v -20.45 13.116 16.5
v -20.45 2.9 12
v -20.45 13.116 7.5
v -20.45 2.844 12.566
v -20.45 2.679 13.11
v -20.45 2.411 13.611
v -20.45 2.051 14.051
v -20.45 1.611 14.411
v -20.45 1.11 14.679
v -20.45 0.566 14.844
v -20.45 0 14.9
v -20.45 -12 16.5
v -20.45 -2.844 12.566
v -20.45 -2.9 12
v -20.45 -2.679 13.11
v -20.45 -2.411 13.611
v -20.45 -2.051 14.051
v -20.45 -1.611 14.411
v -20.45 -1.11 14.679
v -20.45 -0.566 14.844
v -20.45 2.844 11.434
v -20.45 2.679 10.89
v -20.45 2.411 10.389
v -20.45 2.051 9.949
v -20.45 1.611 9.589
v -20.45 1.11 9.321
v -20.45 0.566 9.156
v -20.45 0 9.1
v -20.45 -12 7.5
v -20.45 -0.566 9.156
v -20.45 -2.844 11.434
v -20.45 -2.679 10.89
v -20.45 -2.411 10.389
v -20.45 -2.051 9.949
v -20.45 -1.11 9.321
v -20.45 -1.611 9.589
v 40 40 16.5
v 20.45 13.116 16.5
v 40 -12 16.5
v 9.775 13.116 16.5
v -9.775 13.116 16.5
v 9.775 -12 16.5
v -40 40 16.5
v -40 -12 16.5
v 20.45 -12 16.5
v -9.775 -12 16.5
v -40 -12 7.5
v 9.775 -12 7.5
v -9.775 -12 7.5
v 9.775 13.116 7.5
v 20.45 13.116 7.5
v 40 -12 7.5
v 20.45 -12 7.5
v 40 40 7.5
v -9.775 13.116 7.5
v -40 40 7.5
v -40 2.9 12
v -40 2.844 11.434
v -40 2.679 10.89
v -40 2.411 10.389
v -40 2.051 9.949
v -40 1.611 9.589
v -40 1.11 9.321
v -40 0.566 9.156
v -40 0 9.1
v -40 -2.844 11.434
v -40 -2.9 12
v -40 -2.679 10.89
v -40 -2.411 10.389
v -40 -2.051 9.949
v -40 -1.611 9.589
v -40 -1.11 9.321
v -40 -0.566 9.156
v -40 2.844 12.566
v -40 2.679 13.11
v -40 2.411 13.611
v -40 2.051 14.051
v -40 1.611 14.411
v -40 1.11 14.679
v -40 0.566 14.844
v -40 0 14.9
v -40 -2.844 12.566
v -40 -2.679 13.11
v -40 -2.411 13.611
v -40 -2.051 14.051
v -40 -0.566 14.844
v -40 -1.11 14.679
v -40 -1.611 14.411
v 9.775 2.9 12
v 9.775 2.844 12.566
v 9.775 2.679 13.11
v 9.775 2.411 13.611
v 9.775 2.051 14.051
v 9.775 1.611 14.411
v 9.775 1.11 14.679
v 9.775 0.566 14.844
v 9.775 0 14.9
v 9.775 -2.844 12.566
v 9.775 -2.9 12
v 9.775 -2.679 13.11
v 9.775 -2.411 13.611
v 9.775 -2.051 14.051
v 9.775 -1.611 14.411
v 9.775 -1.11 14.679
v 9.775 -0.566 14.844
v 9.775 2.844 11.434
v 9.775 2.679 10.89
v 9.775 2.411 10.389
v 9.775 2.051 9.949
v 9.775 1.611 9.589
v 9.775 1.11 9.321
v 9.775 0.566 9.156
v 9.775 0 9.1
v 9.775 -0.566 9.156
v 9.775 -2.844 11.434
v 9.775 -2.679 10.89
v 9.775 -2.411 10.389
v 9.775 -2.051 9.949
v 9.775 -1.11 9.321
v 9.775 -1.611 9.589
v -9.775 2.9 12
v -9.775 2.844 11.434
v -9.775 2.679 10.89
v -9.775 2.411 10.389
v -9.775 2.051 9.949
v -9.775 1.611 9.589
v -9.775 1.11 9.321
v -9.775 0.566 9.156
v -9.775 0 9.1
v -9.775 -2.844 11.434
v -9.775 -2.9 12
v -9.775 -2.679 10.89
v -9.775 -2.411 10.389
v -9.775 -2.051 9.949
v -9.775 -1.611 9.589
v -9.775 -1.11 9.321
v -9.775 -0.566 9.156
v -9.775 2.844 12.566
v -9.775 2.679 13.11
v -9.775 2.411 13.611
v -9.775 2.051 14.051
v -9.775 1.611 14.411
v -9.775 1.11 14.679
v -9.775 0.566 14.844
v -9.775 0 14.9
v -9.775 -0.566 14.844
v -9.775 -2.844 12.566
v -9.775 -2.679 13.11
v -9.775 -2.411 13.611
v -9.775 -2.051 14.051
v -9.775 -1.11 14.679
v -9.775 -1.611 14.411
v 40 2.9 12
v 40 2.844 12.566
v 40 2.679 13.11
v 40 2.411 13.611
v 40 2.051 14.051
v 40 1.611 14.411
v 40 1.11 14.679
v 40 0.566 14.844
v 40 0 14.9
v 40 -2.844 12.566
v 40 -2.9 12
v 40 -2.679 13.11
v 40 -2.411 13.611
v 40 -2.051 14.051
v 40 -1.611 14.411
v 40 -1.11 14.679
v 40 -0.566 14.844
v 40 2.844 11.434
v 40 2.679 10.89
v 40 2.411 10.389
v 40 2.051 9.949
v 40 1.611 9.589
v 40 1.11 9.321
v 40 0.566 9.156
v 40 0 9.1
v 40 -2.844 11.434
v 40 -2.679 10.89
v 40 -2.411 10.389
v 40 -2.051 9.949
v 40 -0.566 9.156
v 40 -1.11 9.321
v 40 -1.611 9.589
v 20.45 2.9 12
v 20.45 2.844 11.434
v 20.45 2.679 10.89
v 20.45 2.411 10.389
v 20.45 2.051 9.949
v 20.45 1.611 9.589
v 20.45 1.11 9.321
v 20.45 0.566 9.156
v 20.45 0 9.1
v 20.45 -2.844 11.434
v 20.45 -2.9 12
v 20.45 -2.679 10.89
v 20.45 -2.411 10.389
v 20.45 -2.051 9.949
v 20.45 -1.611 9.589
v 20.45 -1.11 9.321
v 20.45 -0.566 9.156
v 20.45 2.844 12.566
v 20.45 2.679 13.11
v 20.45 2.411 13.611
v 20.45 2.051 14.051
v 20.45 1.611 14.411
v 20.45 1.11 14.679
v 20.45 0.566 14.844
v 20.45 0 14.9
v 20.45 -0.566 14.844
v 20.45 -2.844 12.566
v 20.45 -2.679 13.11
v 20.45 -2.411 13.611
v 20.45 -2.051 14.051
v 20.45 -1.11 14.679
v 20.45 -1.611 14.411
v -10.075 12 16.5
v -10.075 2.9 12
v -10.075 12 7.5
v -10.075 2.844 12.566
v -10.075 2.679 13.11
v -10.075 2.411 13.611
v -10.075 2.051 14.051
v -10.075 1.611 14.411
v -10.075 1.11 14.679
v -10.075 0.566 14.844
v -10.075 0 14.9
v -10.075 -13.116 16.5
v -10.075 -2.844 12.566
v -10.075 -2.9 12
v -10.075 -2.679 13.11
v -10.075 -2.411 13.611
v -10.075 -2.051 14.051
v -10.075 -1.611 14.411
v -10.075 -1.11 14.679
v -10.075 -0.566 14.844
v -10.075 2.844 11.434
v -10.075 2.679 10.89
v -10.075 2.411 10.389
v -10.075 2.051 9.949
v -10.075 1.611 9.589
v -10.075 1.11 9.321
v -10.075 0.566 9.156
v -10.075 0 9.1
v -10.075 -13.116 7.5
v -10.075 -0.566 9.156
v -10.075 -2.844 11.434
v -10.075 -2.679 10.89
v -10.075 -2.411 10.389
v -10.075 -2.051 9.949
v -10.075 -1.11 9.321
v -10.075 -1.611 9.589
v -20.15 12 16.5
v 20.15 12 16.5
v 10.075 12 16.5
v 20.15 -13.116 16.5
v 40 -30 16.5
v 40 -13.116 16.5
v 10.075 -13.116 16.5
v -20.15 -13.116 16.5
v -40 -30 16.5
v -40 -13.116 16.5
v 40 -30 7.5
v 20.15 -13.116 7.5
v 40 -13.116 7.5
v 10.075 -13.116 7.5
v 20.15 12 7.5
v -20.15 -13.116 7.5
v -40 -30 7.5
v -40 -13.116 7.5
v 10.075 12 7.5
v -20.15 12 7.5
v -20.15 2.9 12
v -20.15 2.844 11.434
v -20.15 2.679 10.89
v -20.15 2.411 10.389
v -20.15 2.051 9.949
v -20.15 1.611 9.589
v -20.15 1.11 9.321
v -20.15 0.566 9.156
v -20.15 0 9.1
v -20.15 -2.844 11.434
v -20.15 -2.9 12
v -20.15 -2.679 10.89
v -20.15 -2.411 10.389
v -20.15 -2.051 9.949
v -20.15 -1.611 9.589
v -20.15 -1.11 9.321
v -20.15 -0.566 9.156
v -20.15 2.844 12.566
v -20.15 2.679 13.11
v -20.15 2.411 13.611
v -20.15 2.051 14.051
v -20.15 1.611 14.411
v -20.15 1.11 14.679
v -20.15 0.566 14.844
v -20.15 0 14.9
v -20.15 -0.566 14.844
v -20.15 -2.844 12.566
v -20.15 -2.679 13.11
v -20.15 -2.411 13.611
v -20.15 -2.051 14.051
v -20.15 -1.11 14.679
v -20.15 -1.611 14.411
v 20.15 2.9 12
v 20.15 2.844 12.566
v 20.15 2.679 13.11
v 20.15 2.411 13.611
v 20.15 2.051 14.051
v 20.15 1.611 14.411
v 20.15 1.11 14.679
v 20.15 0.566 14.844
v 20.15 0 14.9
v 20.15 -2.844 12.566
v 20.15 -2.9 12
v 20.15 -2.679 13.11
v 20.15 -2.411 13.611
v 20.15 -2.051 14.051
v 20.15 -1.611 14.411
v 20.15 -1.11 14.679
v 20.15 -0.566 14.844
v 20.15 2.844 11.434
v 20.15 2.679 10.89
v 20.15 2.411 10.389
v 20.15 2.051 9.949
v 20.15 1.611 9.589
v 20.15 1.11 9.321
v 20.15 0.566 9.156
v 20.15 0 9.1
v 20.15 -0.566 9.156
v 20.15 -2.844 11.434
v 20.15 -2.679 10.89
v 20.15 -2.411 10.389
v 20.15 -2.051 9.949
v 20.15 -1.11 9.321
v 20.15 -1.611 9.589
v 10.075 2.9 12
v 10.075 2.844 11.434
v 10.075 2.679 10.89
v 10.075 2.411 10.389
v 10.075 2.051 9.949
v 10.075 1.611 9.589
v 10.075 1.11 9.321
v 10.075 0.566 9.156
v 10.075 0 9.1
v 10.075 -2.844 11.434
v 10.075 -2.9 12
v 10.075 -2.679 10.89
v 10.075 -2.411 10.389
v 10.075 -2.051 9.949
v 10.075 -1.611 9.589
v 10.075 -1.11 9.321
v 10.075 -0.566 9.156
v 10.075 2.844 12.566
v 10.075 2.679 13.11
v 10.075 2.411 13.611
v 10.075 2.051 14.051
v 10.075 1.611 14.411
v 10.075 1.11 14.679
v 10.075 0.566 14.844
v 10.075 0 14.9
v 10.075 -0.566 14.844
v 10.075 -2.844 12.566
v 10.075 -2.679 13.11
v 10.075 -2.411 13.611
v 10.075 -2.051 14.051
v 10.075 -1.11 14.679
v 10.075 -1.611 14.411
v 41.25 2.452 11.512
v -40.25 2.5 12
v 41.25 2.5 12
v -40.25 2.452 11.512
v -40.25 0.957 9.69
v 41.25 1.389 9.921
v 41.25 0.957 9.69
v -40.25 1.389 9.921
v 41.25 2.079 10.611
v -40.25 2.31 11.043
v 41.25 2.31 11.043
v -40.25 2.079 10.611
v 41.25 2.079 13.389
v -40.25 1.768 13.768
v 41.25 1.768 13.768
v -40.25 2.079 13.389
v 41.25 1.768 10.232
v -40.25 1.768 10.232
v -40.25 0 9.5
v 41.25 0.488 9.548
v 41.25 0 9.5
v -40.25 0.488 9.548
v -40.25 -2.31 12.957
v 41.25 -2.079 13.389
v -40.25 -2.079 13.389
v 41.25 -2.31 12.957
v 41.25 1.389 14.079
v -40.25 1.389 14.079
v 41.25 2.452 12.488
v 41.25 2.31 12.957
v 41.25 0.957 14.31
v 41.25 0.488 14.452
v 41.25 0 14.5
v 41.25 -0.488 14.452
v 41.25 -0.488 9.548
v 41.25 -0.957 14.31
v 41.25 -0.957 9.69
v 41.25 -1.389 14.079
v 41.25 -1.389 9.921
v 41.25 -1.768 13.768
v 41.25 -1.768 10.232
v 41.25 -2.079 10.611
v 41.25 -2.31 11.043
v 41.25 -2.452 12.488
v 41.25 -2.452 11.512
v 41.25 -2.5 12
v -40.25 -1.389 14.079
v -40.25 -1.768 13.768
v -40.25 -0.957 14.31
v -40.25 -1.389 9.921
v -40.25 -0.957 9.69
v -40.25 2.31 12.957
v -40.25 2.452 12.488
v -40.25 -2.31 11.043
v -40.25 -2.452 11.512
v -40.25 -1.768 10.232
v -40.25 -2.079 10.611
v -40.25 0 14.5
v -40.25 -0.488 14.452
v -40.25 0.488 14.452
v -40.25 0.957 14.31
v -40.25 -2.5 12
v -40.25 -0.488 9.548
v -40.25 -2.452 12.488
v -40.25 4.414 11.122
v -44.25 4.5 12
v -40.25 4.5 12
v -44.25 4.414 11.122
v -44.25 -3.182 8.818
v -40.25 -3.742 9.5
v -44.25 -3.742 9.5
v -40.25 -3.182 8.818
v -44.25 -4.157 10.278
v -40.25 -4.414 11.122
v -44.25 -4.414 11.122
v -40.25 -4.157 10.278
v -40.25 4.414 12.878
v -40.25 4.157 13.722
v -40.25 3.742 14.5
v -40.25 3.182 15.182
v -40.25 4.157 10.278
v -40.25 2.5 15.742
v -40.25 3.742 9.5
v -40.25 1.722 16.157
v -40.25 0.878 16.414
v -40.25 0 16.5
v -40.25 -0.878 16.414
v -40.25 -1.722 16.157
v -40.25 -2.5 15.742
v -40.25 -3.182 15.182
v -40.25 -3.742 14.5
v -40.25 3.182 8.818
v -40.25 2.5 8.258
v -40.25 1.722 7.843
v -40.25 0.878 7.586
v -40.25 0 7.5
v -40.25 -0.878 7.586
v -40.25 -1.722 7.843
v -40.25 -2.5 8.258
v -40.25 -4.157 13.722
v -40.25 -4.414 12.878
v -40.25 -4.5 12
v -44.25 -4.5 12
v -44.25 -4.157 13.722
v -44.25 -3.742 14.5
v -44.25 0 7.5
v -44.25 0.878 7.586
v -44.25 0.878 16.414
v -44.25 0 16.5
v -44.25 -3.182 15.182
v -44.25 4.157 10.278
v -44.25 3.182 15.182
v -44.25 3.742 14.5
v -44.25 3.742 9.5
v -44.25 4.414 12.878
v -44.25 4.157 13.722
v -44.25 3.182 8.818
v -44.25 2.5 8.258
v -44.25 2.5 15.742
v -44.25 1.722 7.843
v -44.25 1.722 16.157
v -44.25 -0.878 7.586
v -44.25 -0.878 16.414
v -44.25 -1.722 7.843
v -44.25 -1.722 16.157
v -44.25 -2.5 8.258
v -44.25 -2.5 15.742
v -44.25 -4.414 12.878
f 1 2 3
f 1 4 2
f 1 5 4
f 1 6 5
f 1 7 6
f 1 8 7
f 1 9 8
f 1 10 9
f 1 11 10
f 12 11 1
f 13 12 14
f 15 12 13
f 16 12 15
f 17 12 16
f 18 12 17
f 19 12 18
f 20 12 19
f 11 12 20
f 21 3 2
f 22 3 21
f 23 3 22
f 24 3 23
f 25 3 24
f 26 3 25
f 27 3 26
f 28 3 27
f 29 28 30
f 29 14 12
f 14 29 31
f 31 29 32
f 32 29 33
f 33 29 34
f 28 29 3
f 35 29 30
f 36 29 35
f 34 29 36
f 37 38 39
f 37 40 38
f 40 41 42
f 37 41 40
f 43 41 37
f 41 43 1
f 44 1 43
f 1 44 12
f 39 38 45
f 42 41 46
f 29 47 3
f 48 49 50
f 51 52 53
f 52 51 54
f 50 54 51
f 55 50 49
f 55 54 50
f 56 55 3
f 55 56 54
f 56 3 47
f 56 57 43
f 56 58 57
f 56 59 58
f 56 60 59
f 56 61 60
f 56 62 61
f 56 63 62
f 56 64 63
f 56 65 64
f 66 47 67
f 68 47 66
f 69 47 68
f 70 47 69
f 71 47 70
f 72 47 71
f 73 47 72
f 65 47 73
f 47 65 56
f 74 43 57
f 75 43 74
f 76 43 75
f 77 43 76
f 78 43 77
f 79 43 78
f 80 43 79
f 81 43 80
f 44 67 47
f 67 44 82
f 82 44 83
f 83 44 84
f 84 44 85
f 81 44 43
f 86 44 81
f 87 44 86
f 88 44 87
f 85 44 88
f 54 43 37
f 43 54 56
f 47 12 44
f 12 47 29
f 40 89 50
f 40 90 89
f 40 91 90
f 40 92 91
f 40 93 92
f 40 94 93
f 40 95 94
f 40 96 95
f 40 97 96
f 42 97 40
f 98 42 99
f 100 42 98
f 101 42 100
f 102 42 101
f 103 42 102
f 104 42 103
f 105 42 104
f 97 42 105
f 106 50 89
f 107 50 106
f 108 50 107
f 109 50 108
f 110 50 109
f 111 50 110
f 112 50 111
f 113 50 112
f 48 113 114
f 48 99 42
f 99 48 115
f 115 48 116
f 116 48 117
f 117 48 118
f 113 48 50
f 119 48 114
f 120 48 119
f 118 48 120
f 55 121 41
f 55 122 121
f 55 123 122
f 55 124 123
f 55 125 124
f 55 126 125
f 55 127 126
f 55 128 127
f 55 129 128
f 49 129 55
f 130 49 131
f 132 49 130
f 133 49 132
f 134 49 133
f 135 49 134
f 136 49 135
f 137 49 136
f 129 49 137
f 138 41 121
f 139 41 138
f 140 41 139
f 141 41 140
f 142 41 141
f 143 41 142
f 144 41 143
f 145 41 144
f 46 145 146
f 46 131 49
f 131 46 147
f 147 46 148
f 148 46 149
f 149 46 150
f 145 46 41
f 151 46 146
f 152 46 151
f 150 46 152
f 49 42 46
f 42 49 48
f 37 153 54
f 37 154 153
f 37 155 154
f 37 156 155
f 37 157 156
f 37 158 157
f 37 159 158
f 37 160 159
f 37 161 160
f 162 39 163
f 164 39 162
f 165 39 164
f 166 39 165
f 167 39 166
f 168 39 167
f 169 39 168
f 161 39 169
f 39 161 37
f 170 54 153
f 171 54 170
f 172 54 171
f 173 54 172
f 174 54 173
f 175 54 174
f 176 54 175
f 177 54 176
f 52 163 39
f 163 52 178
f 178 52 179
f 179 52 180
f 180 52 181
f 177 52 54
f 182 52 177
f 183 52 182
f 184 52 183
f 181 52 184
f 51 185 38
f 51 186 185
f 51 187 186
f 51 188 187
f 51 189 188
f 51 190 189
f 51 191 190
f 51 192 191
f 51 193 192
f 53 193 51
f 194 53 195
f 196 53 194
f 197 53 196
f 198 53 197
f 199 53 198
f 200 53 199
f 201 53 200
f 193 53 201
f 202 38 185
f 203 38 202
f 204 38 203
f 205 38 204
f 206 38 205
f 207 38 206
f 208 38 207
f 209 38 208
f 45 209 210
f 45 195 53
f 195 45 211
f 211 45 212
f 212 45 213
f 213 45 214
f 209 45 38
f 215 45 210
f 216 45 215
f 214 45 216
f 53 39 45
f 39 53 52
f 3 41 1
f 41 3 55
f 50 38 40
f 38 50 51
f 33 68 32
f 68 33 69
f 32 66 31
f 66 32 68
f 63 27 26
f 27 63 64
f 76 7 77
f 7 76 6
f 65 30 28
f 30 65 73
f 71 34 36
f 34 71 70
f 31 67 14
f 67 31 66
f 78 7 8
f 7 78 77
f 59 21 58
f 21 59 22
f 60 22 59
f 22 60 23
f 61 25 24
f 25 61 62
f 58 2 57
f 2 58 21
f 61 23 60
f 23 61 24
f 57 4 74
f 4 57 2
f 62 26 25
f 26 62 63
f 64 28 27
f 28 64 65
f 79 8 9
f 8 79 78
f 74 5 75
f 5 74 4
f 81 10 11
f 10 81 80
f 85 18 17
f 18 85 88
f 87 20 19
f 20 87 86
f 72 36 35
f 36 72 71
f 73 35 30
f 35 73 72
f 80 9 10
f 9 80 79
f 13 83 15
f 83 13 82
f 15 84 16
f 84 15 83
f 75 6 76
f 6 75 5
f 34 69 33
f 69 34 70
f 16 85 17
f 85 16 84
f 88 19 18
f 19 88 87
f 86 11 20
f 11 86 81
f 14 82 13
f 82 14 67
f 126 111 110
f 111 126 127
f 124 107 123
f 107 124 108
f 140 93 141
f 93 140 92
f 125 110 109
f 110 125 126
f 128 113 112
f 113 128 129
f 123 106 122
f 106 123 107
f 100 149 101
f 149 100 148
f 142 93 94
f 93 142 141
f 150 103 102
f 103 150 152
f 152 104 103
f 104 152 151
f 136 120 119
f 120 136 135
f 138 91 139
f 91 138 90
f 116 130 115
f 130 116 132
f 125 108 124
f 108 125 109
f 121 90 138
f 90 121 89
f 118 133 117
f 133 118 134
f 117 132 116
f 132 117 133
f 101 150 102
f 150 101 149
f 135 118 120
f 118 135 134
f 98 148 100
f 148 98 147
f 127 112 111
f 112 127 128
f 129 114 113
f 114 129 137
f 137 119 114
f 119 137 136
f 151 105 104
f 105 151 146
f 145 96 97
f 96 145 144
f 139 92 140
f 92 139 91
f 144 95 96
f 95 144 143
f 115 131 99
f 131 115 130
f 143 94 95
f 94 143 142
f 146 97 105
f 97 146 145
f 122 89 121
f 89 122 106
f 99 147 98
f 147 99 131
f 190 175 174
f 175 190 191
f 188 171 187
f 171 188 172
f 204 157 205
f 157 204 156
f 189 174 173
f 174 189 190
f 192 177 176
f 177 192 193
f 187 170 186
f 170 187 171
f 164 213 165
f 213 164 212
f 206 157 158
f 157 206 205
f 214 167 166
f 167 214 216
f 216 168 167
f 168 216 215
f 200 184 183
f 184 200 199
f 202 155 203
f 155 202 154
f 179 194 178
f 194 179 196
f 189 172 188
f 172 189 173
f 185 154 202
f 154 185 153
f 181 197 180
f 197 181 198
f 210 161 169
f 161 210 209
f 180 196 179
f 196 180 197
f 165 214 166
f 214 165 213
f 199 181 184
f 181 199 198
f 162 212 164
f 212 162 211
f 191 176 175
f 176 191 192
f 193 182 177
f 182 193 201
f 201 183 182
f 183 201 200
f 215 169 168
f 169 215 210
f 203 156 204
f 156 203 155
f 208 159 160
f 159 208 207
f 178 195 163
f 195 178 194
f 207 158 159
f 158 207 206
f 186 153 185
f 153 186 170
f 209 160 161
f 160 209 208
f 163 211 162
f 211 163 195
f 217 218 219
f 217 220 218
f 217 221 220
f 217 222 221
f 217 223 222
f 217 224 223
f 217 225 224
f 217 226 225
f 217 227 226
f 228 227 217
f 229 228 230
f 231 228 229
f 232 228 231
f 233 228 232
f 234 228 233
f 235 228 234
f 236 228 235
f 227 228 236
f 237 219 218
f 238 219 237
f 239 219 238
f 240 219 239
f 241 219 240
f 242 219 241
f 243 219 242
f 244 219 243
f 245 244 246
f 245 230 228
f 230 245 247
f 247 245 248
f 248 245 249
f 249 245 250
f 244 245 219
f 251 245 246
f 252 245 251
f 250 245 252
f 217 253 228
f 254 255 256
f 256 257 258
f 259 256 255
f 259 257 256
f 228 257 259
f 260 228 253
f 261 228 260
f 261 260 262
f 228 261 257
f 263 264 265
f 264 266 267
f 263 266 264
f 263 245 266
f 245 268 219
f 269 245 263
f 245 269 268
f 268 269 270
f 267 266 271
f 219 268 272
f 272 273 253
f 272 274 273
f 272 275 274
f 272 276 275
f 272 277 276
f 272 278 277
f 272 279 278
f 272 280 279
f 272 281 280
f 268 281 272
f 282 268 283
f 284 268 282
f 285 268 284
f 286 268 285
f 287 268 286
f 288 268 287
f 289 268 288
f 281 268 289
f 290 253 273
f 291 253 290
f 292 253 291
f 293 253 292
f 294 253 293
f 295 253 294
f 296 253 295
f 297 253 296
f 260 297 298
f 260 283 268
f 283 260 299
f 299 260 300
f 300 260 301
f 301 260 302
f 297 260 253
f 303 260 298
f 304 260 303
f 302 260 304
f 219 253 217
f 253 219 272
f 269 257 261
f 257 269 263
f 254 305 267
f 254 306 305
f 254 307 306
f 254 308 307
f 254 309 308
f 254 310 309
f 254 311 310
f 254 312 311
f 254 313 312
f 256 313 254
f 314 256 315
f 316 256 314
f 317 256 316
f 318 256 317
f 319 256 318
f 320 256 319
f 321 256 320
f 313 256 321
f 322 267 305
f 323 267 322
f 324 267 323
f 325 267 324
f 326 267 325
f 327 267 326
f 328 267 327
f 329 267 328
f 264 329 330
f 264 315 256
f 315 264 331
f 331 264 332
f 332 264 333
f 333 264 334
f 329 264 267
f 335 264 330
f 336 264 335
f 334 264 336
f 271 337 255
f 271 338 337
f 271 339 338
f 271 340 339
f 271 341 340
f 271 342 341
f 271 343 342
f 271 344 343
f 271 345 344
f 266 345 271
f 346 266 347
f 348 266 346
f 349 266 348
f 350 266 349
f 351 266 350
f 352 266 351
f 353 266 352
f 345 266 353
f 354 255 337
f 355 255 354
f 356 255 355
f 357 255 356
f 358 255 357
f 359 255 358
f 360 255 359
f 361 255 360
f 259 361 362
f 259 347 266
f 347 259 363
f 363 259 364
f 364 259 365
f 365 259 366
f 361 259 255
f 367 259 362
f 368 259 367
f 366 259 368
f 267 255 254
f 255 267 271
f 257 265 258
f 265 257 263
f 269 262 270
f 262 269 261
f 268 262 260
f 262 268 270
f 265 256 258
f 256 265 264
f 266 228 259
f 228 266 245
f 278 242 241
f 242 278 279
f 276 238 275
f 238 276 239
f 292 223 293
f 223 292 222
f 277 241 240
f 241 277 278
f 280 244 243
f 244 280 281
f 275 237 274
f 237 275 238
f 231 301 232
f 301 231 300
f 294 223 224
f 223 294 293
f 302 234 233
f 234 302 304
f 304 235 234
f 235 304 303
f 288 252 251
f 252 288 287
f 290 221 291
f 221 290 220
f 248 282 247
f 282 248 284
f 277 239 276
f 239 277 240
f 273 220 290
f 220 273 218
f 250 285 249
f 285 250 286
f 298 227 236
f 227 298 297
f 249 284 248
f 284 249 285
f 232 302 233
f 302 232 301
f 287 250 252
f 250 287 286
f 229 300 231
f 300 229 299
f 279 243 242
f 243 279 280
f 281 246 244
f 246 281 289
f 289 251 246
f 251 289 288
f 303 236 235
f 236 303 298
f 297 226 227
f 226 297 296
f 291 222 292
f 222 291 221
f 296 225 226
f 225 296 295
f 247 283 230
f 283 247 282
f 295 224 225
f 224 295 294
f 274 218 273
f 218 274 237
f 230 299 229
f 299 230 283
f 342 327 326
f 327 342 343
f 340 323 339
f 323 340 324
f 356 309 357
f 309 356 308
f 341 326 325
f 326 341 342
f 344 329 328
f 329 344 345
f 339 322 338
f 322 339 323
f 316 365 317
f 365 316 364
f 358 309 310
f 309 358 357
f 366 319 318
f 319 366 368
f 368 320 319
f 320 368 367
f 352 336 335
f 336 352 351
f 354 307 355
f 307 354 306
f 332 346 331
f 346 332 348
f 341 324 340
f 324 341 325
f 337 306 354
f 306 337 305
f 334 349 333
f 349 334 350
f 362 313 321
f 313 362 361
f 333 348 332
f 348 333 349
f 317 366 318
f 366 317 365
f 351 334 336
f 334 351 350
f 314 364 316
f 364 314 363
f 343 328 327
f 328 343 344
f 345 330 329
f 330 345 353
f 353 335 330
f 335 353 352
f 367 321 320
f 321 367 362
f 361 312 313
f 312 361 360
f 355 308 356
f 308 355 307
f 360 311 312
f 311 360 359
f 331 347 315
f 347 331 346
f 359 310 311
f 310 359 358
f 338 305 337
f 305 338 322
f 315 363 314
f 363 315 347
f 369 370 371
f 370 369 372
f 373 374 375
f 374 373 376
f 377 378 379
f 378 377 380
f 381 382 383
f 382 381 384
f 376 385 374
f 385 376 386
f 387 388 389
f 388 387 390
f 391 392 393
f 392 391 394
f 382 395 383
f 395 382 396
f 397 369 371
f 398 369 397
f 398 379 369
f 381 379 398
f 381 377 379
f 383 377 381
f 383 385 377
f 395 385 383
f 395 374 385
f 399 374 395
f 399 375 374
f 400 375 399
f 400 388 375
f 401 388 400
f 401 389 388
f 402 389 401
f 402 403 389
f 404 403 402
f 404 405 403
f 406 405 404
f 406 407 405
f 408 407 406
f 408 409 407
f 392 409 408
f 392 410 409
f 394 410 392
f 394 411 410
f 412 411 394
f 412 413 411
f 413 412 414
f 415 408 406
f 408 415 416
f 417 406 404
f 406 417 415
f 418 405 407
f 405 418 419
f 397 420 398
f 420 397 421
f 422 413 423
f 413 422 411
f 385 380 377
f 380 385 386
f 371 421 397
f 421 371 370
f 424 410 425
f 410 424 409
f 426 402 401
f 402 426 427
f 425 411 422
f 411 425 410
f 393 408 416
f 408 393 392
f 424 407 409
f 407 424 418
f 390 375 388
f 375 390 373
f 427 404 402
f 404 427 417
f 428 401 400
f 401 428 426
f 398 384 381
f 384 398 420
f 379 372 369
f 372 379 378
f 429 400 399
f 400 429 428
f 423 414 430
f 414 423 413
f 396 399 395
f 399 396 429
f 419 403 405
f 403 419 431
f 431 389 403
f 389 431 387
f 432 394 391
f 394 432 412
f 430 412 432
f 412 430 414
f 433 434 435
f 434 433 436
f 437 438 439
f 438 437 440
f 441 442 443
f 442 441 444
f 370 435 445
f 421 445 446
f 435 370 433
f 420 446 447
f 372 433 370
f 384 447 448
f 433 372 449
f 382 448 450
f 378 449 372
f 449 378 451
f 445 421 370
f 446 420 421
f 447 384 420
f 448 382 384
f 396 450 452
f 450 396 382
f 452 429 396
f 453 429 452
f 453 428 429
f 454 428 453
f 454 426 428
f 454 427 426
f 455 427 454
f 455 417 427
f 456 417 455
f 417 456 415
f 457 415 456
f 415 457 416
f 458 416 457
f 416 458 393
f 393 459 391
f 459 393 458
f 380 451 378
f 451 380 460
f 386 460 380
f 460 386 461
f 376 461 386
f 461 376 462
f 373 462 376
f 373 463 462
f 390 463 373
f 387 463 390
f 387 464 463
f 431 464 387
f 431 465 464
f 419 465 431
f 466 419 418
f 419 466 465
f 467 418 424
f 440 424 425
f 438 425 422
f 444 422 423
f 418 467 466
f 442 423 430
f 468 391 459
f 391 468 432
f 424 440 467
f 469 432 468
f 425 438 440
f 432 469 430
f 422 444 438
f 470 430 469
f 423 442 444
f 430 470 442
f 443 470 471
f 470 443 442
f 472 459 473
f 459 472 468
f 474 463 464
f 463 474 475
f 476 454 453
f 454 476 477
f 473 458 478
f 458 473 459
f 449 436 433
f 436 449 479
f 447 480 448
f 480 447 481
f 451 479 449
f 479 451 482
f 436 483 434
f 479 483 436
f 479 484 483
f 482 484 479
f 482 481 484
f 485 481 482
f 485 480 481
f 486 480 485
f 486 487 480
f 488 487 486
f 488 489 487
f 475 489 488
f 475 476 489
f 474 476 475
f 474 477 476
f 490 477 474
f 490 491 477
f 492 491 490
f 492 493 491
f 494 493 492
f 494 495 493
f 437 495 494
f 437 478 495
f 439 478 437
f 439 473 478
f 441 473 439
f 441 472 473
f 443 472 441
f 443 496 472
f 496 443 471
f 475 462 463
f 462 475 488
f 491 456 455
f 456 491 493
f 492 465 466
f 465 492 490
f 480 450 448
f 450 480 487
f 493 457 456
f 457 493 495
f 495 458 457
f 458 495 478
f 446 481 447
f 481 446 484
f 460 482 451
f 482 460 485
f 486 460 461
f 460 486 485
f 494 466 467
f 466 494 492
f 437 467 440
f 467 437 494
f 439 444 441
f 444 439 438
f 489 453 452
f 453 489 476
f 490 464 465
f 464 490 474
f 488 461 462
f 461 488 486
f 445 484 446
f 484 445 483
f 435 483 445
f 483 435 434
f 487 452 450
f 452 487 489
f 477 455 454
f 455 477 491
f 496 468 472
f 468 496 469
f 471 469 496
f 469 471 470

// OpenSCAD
$fn = 32;

// ------------------------------------------------------------------------
// Butt hinge: hinge 80 mm, leaf swung 0 deg
// Every part is its own module, assembly() places every instance.
// ------------------------------------------------------------------------

// --- part 1 ---
module hinge_base() {
  difference() {
    union() {
      translate([-40, -12, -4.5]) cube([19.55, 52, 9]);
      translate([-9.775, -12, -4.5]) cube([19.55, 52, 9]);
      translate([20.45, -12, -4.5]) cube([19.55, 52, 9]);
      translate([-40, 13.116, -4.5]) cube([80, 26.884, 9]);
    }
    translate([-30.225, 0, 0]) rotate([0, 90, 0]) cylinder(h = 21.55, d = 5.8, center = true);
    translate([0, 0, 0]) rotate([0, 90, 0]) cylinder(h = 21.55, d = 5.8, center = true);
    translate([30.225, 0, 0]) rotate([0, 90, 0]) cylinder(h = 21.55, d = 5.8, center = true);
  }
}

// --- part 2 ---
module hinge_mover() {
  difference() {
    union() {
      translate([-20.15, -30, -4.5]) cube([10.075, 42, 9]);
      translate([10.075, -30, -4.5]) cube([10.075, 42, 9]);
      translate([-40, -30, -4.5]) cube([80, 16.884, 9]);
    }
    translate([-15.113, 0, 0]) rotate([0, 90, 0]) cylinder(h = 12.075, d = 5.8, center = true);
    translate([15.113, 0, 0]) rotate([0, 90, 0]) cylinder(h = 12.075, d = 5.8, center = true);
  }
}

// --- part 3 ---
module hinge_pin() {
  rotate([0, 90, 0]) cylinder(h = 82.5, d = 5, center = true);
  translate([-44.25, 0, 0]) rotate([0, 90, 0]) cylinder(h = 4, d = 9);
}

// --- assembly ---
module assembly() {
  color([0.80, 0.24, 0.20]) translate([0, 0, 12]) rotate([0, 0, 0]) hinge_base();
  color([0.20, 0.45, 0.75]) translate([0, 0, 12]) rotate([0, 0, 0]) hinge_mover();
  color([0.25, 0.62, 0.32]) translate([0, 0, 12]) rotate([0, 0, 0]) hinge_pin();
}

assembly();
